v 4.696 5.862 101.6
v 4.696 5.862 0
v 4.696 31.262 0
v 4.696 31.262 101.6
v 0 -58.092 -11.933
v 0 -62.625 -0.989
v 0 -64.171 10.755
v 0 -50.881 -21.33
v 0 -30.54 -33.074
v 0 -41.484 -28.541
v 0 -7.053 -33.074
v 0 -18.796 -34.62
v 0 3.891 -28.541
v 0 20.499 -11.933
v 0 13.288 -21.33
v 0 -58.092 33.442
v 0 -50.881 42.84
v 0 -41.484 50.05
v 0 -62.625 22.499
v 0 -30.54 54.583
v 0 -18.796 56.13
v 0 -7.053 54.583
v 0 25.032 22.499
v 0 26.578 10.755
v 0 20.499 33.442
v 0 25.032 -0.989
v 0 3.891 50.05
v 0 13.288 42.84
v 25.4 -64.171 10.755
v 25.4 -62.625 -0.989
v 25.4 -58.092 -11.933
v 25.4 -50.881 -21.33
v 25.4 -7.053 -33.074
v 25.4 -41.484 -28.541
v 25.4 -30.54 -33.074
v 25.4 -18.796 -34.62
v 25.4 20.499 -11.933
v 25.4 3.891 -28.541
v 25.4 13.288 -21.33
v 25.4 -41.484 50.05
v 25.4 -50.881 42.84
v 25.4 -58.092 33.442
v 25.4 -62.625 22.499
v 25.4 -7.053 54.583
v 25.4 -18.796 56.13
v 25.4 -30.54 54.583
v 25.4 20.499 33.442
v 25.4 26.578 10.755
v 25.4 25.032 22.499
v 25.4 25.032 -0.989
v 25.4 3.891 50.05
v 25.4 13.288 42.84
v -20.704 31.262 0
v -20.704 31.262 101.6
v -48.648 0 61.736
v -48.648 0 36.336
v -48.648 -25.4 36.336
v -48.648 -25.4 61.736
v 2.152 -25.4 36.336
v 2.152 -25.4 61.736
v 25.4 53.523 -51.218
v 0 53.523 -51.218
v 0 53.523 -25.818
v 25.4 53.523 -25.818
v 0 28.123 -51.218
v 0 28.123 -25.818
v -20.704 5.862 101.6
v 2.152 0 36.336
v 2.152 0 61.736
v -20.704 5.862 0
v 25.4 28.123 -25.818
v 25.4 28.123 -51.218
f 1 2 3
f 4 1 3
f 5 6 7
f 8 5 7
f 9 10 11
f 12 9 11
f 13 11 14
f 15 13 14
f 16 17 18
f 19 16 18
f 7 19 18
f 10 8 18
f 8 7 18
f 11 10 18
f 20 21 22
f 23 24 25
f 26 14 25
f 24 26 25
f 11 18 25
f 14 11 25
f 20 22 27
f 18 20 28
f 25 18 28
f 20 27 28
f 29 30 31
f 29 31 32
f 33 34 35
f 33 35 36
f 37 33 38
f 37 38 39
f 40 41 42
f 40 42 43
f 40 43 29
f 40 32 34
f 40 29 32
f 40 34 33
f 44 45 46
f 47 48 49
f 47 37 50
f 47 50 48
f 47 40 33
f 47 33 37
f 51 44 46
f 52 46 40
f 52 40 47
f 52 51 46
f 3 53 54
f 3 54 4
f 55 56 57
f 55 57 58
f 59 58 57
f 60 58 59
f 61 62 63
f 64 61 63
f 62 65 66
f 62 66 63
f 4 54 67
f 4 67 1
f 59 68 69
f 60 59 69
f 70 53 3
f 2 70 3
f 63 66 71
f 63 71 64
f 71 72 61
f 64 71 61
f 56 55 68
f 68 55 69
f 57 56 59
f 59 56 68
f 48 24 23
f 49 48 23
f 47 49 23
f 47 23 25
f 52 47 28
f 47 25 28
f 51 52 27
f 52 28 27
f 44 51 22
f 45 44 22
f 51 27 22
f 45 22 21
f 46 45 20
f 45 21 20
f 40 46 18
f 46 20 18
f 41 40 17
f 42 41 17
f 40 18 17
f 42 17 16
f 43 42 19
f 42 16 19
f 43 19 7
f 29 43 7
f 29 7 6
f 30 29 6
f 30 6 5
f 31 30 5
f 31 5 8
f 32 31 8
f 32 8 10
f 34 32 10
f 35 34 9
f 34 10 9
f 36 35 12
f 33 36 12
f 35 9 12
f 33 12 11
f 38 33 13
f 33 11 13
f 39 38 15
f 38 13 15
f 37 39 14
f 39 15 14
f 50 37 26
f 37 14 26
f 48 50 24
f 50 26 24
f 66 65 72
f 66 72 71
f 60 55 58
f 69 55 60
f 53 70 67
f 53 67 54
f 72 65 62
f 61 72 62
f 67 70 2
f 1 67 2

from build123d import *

# Parameters (mm, degrees)
F0_W     = 50.8
F0_H     = 25.4
F1_DEPTH = 25.4
F2_W     = 25.4
F2_H     = 25.4
F3_DEPTH = 101.6
F4_W     = 25.4
F4_H     = 25.4
F5_DEPTH = 25.4
F6_DEPTH = 25.4
F7_R     = 45.37484
F8_DEPTH = 25.4


with BuildPart() as f1:
    # F0 (on Front) → F1 (new body)
    with BuildSketch(Plane.XZ):
        with Locations((-23.247538, 49.035968)):
            Rectangle(F0_W, F0_H)
    extrude(amount=F1_DEPTH)


with BuildPart() as f3:
    # F2 (on Top) → F3 (new body)
    with BuildSketch(Plane.XY):
        with Locations((-8.00392, 18.561696)):
            Rectangle(F2_W, F2_H)
    extrude(amount=F3_DEPTH)

    # F2 (on Top) → F6 (join)
    with BuildSketch(Plane.XY):
        with Locations((-8.00392, 18.561696)):
            Rectangle(F2_W, F2_H)
    extrude(amount=F6_DEPTH)


with BuildPart() as f5:
    # F4 (on Right) → F5 (new body)
    with BuildSketch(Plane.YZ):
        with Locations((40.823363, -38.518067)):
            Rectangle(F4_W, F4_H)
    extrude(amount=F5_DEPTH)


with BuildPart() as f8:
    # F7 (on Right) → F8 (new body)
    with BuildSketch(Plane.YZ):
        with Locations((-18.796373, 10.754699)):
            Circle(F7_R)
    extrude(amount=F8_DEPTH)


solid = Compound([f1.part, f3.part, f5.part, f8.part])
